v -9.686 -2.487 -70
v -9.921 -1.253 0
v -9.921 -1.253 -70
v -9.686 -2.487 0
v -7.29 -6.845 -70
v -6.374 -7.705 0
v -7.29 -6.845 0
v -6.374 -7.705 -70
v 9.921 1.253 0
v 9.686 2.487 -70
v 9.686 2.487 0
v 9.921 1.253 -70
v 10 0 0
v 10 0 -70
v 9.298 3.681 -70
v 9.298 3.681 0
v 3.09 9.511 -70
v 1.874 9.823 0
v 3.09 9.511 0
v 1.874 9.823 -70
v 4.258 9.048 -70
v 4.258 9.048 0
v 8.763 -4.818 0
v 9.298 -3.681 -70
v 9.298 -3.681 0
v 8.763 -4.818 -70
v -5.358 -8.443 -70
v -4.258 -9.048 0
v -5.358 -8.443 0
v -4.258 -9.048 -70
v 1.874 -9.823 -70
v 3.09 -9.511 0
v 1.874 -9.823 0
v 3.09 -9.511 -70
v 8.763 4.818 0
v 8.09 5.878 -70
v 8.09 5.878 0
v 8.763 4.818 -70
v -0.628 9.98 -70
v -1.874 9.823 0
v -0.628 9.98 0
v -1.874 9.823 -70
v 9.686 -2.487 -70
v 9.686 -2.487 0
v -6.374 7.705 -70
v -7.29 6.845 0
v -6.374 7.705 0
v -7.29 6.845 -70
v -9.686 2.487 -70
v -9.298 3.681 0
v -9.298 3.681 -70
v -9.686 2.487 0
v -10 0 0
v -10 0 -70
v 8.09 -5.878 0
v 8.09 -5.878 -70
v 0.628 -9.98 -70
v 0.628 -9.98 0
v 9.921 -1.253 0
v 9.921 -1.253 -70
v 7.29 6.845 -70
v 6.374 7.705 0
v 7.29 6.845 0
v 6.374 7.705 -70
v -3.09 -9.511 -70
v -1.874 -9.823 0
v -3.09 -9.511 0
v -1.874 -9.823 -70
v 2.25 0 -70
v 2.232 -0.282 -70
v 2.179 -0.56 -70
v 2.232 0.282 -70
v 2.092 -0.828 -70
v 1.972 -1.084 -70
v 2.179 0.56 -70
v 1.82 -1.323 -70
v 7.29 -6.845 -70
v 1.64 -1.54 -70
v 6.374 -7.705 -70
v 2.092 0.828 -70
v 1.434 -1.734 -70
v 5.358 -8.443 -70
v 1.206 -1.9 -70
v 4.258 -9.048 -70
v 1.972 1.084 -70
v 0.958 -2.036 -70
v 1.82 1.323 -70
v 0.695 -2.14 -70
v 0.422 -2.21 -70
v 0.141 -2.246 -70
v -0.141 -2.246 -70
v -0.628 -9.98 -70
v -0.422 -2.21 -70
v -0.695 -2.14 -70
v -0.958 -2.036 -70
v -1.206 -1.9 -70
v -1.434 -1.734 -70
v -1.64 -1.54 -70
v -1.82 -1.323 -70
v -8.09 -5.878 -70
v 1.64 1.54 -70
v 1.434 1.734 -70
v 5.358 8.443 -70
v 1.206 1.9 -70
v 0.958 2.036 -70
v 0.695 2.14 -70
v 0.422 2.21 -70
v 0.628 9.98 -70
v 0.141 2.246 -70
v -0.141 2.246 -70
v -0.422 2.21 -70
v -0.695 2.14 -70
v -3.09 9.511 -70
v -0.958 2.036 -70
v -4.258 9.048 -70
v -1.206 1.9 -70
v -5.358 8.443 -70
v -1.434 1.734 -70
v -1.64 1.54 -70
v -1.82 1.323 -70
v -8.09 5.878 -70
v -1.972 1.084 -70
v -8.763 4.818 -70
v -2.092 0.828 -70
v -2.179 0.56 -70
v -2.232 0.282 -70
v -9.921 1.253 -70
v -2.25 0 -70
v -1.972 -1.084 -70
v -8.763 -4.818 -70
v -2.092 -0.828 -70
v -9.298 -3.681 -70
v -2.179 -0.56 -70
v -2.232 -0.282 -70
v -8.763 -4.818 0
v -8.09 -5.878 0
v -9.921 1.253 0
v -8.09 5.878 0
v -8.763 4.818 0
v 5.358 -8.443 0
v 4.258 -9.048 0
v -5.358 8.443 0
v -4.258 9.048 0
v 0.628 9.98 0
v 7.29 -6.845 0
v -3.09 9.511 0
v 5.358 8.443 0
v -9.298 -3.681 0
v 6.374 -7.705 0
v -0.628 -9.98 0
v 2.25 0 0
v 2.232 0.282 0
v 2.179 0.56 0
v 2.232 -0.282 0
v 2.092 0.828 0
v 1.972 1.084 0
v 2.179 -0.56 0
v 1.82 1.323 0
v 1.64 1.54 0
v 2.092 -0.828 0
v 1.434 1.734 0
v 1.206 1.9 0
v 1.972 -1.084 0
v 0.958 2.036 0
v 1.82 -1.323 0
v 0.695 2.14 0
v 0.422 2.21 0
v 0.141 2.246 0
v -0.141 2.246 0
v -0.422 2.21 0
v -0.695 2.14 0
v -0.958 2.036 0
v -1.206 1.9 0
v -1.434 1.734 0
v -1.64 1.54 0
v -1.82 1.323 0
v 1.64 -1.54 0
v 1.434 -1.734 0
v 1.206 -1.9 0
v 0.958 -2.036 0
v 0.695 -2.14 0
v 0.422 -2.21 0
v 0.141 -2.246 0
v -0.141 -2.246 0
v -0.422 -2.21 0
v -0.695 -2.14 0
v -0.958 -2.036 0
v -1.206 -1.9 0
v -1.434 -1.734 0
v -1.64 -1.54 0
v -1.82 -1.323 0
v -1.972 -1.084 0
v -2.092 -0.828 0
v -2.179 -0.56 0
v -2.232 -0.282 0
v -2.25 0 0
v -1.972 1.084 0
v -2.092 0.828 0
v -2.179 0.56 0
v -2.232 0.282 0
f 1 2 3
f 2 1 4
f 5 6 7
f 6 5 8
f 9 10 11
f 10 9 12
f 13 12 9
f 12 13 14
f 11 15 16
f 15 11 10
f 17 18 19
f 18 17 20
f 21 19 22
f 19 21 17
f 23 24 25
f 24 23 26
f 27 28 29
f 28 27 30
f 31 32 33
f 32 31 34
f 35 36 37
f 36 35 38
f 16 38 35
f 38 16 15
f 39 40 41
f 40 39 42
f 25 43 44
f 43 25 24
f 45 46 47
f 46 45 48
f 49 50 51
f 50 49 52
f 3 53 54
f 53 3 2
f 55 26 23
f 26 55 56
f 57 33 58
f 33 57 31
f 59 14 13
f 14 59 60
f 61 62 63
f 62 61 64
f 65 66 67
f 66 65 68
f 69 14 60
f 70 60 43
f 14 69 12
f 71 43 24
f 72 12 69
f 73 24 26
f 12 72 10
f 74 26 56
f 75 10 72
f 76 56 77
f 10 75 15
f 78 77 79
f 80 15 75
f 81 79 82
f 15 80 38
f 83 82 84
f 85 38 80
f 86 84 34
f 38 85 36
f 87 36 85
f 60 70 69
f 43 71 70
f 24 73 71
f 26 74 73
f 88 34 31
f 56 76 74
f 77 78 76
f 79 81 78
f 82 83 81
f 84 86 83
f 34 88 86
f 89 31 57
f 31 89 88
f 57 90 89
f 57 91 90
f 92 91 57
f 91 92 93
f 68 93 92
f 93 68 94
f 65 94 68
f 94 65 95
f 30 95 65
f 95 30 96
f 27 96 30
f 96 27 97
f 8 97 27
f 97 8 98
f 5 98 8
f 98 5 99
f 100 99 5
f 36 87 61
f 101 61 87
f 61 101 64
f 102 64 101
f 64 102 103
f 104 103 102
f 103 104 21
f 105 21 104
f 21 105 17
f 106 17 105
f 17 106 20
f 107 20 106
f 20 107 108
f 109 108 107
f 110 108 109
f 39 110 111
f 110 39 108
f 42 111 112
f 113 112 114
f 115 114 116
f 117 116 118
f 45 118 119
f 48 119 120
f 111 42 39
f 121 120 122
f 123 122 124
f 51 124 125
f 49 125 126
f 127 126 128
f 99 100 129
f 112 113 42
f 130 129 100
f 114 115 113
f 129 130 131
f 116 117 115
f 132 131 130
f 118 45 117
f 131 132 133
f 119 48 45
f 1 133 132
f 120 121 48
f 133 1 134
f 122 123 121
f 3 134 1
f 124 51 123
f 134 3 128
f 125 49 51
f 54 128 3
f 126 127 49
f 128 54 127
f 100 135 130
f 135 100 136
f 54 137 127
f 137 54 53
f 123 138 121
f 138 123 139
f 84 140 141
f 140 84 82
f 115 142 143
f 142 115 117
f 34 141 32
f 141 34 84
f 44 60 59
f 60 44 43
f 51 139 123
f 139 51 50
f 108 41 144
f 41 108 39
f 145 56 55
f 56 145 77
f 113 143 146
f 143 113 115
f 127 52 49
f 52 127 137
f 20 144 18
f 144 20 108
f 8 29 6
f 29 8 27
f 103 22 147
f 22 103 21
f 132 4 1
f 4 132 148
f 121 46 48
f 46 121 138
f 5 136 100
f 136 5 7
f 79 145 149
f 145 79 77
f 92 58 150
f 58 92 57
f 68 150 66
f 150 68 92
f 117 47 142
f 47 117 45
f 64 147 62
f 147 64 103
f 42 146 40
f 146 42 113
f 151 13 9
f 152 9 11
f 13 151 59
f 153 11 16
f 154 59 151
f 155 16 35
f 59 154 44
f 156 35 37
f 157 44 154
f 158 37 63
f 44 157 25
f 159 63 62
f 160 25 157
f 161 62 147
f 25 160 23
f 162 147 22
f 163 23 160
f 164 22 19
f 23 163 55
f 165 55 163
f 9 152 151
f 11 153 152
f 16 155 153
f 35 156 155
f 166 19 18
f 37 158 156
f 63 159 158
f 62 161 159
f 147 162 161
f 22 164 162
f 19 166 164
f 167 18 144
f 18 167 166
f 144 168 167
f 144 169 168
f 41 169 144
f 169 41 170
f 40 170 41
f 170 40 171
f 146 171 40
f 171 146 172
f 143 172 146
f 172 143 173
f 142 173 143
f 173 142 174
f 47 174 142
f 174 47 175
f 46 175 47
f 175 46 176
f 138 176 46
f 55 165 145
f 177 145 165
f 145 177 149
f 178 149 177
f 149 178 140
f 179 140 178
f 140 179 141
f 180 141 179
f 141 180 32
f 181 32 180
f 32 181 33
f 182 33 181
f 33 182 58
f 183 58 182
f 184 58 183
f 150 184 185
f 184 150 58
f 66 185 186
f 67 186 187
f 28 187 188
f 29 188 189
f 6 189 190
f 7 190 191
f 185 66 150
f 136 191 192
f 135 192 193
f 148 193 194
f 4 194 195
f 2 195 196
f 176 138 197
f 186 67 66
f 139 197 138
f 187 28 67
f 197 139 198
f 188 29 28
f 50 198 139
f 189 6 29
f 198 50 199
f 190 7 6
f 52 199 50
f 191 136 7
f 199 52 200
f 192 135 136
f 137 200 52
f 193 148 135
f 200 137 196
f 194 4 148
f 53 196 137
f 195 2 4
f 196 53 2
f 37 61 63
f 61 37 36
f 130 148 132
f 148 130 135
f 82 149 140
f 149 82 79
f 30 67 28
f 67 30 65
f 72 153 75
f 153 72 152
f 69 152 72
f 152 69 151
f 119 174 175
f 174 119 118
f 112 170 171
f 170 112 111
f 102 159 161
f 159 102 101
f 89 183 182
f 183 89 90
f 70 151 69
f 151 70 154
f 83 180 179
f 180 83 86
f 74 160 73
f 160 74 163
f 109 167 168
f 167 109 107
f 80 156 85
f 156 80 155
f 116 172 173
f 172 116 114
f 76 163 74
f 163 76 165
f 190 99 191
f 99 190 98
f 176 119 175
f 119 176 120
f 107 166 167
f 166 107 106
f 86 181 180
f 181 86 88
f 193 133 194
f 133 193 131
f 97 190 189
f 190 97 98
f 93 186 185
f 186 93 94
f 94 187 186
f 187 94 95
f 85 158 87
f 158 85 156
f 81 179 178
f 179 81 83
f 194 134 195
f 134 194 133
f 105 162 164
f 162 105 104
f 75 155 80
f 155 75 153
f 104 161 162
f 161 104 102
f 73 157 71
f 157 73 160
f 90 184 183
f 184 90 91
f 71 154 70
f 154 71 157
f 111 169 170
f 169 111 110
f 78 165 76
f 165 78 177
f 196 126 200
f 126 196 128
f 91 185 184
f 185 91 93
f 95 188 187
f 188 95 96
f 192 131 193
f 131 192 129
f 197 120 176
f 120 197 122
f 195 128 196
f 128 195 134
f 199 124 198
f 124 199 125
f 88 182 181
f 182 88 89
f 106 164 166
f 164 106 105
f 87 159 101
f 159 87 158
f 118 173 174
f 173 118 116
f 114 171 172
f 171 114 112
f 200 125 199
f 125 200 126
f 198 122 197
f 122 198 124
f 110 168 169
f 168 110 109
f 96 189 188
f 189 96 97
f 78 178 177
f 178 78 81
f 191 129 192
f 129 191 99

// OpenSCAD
$fn = 50;


difference() {
	union() {
		translate(v = [0, 0, -70.0000000000]) {
			cylinder(h = 70, r = 10.0000000000);
		}
		cylinder(h = 0, r = 16.0000000000);
	}
	union() {
		#translate(v = [0, 0, -70]) {
			cylinder(h = 70, r = 2.2500000000);
		}
	}
}
